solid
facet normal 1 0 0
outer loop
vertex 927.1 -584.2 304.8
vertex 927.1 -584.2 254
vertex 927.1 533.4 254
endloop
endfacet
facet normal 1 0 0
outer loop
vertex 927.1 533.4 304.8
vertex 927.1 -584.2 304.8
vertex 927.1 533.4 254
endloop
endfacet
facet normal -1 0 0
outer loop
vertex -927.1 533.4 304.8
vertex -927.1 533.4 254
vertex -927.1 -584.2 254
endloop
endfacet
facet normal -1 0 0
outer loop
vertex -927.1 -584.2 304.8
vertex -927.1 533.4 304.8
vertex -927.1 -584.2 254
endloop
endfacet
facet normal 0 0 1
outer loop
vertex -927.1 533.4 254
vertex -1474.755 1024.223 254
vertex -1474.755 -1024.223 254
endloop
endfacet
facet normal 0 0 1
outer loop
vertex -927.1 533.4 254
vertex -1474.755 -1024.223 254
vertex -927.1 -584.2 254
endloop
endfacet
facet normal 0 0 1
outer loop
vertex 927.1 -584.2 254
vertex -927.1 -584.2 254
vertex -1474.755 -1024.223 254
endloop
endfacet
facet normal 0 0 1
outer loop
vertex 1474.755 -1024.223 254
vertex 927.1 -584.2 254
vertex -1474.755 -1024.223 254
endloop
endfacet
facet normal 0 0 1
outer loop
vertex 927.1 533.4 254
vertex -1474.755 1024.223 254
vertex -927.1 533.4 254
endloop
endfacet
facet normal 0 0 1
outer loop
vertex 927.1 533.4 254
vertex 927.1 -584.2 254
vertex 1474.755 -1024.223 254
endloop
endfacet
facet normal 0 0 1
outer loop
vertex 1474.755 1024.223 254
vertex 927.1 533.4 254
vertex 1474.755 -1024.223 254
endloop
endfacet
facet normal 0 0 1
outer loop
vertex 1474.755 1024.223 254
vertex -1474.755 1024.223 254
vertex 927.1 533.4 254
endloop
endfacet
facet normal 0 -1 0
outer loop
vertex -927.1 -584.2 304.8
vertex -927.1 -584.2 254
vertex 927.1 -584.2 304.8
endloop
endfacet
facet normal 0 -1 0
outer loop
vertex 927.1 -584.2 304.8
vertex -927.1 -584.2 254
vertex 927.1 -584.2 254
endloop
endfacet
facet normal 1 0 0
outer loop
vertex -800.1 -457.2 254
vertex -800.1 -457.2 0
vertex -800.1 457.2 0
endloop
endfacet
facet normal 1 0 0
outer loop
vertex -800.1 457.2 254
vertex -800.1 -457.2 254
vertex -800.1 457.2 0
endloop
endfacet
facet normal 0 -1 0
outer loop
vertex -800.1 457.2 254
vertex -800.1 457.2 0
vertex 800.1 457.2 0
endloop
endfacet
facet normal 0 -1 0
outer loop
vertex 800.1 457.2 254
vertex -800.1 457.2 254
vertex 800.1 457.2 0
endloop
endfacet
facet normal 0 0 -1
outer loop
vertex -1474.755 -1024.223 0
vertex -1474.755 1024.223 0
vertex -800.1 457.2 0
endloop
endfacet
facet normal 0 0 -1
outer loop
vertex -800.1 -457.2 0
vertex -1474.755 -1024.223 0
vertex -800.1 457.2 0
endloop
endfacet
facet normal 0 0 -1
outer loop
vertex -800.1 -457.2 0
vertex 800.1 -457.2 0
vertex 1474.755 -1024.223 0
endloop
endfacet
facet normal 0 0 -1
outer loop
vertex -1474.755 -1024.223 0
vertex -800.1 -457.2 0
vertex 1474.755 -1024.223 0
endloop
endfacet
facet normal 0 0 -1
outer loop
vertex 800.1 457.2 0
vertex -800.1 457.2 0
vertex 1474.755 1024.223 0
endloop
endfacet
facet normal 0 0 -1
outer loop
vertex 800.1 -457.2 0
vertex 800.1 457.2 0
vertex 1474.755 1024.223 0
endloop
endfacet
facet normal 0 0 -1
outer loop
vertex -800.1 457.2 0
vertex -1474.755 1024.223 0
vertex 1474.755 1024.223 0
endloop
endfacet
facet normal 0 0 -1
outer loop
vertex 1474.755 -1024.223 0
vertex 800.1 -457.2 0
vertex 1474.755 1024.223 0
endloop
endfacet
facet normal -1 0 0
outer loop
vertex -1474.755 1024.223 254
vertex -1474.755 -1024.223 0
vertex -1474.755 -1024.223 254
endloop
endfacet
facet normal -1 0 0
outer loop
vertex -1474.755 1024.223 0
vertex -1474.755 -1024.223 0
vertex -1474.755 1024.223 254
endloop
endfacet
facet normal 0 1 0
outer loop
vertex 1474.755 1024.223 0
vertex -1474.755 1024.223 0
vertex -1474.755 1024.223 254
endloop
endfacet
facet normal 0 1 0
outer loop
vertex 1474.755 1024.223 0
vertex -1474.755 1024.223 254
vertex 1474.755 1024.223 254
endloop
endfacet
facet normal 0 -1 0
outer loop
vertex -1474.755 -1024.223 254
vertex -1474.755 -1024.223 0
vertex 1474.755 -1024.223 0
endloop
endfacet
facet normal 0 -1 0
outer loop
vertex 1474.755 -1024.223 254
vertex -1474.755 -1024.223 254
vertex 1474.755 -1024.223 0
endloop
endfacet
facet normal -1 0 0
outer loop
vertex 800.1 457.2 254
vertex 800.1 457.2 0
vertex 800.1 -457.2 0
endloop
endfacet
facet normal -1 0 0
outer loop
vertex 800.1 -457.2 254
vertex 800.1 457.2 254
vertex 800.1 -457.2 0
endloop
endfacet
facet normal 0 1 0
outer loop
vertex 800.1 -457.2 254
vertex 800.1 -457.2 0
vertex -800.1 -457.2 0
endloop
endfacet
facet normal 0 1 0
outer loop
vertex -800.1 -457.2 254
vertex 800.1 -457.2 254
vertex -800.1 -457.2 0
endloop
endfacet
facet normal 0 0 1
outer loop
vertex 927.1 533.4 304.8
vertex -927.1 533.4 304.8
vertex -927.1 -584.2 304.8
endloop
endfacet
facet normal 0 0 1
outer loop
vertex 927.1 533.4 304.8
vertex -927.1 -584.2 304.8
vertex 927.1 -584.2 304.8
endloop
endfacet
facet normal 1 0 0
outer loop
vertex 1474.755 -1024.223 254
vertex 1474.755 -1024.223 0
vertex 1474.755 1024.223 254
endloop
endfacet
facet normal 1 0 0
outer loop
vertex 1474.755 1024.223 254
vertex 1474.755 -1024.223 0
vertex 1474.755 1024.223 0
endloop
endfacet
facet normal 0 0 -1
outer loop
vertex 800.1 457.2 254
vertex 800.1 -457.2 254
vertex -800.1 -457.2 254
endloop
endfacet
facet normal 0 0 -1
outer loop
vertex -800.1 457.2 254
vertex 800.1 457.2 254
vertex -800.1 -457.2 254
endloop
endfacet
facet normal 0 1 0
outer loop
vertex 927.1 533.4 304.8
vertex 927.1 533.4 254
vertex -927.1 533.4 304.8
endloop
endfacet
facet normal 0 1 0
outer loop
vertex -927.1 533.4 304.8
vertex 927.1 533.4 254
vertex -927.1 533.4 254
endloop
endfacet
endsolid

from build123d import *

# Parameters (mm, degrees)
F0_W     = 2949.5098590851
F0_H     = 2048.4457015991
F0_W_2   = 1600.2
F0_H_2   = 914.4
F1_DEPTH = 254
F3_DEPTH = 50.8
F4_W     = 1600.2
F4_H     = 50.8
F5_DEPTH = 914.4


with BuildPart() as f1:
    # F0 (on Top) → F1 (new body)
    with BuildSketch(Plane.XY):
        Rectangle(F0_W, F0_H)
        Rectangle(F0_W_2, F0_H_2, mode=Mode.SUBTRACT)
    extrude(amount=F1_DEPTH)

    # F2 (on face) → F3 (join)
    with BuildSketch(Plane.XY.offset(254)):
        Polygon((-927.1, -584.2), (-800.1, -457.2), (-800.1, 457.2), (-927.1, 533.4), (-927.1, 457.2), (-927.1, -457.2), align=None)
        Polygon((-927.1, 533.4), (-800.1, 457.2), (800.1, 457.2), (927.1, 533.4), (800.1, 533.4), (-800.1, 533.4), align=None)
        Polygon((800.1, 457.2), (800.1, -457.2), (927.1, -584.2), (927.1, -457.2), (927.1, 533.4), align=None)
        Polygon((800.1, -457.2), (-800.1, -457.2), (-927.1, -584.2), (927.1, -584.2), align=None)
    extrude(amount=F3_DEPTH)

    # F4 (on face) → F5 (join, through all)
    with BuildSketch(Plane(origin=(0, -457.2, 0), x_dir=(-1, 0, 0), z_dir=(0, 1, 0))):
        with Locations((0, 279.4)):
            Rectangle(F4_W, F4_H)
    extrude(amount=F5_DEPTH)


solid = f1.part
